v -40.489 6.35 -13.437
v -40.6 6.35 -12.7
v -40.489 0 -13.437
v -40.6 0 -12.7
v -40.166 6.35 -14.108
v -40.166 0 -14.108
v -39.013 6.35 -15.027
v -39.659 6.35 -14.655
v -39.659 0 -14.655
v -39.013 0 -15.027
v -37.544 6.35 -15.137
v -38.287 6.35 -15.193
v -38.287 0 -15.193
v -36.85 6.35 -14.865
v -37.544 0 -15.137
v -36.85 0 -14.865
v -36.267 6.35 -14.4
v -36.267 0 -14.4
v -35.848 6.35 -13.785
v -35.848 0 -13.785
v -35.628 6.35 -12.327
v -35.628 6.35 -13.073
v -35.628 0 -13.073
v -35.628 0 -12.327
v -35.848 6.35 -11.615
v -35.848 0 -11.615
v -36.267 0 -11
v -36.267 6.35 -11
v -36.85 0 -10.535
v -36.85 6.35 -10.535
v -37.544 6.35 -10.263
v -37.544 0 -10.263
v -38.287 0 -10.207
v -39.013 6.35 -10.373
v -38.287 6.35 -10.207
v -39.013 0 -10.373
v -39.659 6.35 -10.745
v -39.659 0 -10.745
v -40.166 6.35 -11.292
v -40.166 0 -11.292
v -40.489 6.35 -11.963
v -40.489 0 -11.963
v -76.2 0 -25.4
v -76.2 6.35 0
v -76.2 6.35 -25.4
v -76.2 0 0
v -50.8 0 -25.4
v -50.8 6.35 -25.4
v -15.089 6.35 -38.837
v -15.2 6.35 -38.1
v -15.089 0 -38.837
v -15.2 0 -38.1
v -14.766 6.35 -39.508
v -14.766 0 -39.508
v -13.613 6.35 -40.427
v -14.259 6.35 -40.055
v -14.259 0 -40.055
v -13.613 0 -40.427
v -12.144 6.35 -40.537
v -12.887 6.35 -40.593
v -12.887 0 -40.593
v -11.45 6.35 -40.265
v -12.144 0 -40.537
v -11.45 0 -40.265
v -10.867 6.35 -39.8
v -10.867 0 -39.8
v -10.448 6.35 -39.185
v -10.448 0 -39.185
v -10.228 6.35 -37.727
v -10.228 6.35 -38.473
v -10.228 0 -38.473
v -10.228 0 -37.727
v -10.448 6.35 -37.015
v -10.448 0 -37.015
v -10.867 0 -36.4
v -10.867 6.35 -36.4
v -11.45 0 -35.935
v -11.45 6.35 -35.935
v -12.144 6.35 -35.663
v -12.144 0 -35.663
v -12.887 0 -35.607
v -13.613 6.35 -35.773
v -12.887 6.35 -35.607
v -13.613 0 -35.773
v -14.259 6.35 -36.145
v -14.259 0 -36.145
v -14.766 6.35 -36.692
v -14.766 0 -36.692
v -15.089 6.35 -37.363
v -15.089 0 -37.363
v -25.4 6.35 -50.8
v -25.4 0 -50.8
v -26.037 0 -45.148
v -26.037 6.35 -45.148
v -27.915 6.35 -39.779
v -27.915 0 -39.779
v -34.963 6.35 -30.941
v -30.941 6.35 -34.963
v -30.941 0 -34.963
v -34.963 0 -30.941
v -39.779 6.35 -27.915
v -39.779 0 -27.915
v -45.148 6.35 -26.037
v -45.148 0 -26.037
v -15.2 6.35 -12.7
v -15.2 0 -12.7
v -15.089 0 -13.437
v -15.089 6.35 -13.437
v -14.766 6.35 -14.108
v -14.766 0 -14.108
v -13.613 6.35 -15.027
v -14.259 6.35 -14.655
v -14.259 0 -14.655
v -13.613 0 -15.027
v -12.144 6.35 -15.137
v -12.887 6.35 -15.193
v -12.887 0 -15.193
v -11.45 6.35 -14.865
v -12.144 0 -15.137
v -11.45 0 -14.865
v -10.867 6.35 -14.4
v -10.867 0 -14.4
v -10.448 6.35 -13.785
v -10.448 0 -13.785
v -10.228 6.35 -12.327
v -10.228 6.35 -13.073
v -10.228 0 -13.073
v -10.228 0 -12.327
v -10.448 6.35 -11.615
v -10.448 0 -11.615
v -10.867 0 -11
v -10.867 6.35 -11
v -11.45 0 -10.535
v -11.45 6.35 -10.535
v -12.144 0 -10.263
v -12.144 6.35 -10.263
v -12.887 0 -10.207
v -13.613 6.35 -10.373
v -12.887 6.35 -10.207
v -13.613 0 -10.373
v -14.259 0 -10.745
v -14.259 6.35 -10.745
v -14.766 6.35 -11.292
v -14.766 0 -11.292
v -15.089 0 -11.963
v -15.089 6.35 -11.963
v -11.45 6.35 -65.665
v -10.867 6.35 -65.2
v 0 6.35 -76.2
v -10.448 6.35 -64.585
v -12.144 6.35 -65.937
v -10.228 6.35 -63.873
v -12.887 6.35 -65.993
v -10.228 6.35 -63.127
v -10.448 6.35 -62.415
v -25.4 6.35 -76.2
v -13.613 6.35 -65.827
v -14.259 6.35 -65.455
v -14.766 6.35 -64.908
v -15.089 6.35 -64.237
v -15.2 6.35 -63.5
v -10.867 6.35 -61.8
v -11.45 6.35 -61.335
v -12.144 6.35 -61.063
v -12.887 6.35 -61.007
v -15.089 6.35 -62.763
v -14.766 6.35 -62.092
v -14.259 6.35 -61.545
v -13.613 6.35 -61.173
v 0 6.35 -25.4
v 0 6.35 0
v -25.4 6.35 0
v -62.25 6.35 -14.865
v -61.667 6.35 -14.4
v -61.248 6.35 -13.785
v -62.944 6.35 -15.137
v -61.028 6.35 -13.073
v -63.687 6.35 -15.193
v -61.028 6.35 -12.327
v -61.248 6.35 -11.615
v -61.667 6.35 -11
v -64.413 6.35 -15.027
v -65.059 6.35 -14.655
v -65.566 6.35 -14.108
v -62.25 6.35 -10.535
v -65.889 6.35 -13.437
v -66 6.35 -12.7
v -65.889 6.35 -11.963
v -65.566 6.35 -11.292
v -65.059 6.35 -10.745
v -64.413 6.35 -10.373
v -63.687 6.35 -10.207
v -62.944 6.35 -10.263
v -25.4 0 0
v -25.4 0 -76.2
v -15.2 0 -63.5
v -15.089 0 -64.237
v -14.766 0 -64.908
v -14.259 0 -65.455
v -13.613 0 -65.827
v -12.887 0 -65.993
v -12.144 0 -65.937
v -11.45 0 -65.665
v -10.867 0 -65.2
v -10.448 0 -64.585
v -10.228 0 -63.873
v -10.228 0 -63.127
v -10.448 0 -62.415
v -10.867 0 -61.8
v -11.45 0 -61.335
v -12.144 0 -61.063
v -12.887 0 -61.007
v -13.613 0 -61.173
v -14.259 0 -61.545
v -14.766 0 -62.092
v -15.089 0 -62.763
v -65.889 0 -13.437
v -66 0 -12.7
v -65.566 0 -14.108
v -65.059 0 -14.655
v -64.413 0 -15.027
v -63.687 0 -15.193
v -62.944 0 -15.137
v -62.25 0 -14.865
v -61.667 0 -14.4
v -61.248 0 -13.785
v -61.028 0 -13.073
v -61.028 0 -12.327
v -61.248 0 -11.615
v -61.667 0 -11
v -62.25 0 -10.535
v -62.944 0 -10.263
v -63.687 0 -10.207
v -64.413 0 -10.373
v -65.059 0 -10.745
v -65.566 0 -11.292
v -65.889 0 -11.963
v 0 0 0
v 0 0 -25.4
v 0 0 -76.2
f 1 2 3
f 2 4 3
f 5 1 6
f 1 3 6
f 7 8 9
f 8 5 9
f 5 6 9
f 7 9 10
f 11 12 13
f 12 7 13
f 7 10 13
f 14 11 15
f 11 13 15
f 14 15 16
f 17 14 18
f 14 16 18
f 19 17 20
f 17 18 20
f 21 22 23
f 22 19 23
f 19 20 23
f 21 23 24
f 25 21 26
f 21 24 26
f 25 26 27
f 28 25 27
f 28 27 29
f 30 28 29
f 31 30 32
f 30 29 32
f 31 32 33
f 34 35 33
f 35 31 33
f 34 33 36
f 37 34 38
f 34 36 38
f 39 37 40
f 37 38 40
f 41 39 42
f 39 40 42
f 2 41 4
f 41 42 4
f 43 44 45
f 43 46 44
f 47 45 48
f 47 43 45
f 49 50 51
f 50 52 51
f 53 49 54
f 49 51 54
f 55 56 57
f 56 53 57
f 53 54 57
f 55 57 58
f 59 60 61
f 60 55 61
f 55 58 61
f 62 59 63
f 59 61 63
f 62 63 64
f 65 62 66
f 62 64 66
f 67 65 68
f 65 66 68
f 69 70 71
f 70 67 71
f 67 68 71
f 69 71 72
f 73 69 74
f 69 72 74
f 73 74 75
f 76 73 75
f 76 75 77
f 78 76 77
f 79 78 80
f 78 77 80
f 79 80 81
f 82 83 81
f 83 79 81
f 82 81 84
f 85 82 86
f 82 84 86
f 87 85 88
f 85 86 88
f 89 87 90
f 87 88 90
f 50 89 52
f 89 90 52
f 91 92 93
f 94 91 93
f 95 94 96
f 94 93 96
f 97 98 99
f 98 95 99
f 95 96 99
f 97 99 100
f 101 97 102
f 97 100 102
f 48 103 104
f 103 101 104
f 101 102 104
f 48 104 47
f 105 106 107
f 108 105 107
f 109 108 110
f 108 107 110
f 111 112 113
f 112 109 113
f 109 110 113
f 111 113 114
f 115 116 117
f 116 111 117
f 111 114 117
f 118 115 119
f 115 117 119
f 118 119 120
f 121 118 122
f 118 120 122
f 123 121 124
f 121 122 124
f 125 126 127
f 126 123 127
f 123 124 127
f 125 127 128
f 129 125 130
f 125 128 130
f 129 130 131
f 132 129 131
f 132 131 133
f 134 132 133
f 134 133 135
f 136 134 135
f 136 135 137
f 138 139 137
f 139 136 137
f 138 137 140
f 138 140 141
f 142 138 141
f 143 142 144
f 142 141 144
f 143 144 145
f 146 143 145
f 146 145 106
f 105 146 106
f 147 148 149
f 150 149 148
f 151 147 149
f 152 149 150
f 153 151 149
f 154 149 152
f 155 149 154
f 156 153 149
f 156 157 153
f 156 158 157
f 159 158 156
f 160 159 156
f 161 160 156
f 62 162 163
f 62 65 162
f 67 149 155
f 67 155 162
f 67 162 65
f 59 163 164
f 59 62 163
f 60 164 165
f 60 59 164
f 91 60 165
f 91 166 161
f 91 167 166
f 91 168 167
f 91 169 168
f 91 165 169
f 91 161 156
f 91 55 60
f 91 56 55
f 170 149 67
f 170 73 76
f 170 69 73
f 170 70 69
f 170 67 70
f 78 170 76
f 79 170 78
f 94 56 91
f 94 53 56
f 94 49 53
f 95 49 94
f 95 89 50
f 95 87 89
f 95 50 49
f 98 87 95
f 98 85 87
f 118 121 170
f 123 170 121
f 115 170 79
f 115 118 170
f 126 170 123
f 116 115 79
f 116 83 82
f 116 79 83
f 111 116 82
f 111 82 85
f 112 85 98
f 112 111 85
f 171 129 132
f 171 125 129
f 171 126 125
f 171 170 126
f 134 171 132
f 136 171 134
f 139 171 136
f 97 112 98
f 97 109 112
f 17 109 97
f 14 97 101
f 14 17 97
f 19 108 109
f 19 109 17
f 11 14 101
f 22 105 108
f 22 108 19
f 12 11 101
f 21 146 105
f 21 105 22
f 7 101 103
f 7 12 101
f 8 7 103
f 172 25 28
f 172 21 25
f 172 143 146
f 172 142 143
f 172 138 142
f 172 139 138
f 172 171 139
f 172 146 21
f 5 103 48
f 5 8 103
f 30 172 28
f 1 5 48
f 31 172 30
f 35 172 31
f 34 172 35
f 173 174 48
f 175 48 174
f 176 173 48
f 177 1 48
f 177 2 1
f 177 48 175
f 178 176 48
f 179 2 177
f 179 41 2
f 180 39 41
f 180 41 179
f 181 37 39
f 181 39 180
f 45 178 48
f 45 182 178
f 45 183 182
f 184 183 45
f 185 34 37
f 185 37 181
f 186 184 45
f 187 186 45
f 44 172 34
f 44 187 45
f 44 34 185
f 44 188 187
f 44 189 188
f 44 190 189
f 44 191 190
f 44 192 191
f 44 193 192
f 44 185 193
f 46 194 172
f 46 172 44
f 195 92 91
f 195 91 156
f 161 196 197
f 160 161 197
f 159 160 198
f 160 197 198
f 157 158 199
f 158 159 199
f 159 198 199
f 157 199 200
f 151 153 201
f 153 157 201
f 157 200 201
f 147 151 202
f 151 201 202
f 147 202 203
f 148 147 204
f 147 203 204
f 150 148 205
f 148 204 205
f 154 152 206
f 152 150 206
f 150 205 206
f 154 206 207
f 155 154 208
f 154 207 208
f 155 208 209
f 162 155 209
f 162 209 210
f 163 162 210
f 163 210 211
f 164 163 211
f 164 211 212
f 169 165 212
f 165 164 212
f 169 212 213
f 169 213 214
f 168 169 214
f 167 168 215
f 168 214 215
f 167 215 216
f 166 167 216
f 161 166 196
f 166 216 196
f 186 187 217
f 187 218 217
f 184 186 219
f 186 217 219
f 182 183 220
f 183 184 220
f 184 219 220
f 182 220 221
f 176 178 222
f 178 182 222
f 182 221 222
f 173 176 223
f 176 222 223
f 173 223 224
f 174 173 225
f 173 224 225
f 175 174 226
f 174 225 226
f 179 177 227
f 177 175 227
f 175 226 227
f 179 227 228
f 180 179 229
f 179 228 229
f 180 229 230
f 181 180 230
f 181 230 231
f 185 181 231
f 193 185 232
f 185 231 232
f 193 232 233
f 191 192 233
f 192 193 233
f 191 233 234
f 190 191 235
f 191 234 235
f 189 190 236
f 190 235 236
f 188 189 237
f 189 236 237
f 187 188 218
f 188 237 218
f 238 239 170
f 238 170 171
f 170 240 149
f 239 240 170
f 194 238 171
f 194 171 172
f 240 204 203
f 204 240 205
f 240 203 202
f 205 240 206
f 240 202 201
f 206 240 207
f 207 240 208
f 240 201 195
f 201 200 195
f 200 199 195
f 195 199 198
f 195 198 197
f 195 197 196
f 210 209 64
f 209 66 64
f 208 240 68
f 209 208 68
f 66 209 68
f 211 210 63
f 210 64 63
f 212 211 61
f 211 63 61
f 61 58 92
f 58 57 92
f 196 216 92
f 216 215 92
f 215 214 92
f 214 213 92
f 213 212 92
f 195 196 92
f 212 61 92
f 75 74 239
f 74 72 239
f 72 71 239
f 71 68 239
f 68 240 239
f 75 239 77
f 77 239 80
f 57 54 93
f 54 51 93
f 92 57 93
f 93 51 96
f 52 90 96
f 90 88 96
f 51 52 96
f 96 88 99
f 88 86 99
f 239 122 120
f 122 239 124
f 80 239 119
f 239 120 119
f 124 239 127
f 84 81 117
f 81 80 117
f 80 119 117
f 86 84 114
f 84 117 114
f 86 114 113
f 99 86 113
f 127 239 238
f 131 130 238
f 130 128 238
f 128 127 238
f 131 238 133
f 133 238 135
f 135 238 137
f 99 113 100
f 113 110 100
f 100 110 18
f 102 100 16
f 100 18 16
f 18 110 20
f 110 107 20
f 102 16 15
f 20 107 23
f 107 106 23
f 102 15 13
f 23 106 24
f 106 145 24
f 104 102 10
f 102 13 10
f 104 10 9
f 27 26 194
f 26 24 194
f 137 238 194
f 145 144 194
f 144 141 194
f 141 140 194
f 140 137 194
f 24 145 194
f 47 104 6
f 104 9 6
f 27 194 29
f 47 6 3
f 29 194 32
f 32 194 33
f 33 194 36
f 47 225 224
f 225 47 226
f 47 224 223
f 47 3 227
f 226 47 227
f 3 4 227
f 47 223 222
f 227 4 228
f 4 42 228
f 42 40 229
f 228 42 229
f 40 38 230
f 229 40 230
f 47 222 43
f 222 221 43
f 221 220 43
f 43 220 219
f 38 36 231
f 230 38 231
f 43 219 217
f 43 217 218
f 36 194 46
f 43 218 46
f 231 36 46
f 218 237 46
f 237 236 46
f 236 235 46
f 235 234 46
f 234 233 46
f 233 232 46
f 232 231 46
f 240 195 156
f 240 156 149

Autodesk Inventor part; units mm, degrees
ref_plane "YZ Plane" through (0, 0, 0) normal (1, 0, 0) x (0, 1, 0)
ref_plane "XZ Plane" through (0, 0, 0) normal (0, 1, 0) x (-1, 0, 0)
ref_plane "XY Plane" through (0, 0, 0) normal (0, 0, 1) x (1, 0, 0)
sketch "Sketch1" plane through (0, 0, 0) normal (0, 1, 0) x (-1, 0, 0)
  line L0 (0, 0) -> (76.2, 0)
  line L1 (76.2, 0) -> (76.2, -25.4)
  line L2 (76.2, -25.4) -> (50.8, -25.4)
  line L3 (0, -25.4) -> (0, 0)
  line L4 (0, 0) -> (25.4, 0)
  line L5 (25.4, -50.8) -> (25.4, -76.2)
  line L6 (25.4, -76.2) -> (0, -76.2)
  line L7 (0, -76.2) -> (0, 0)
  arc A0 (50.8, -25.4) -> (25.4, -50.8) centre (50.8, -50.8) ccw
  circle A1 centre (63.5, -12.7) radius 2.5
  circle A2 centre (38.1, -12.7) radius 2.5
  circle A3 centre (12.7, -12.7) radius 2.5
  circle A4 centre (12.7, -38.1) radius 2.5
  circle A5 centre (12.7, -63.5) radius 2.5
  point P0 (12.7, -76.2)
  point P1 (76.2, -12.7)
  dimension "d0" = 76.2
  dimension "d1" = 25.4
  dimension "d2" = 25.4
  dimension "d3" = 76.2
  dimension "d4" = 25.4
  dimension "d5" = 5
  dimension "d6" = 5
  dimension "d7" = 5
  dimension "d8" = 5
  dimension "d9" = 5
  dimension "d10" = 12.7
  dimension "d11" = 12.7
  dimension "d12" = 12.7
  dimension "d13" = 12.7
  dimension "d14" = 12.7
  dimension "d15" = 12.7
  dimension "d16" = 38.1
  dimension "d17" = 38.1
  dimension "d18" = 12.7
  dimension "d19" = 12.7
extrude "Extrusion1" add sketch "Sketch1" along normal blind 6.35
equation "\"d11\" = d10"
equation "\"d12\" = d10"
equation "\"d13\" = d10"
equation "\"d14\" = d10"
equation "\"d15\" = d14"
equation "\"d16\" = 0.5 * d3"
equation "\"d17\" = 0.5 * d0"
equation "\"d18\" = d10"
equation "\"d19\" = d10"
properties part number "90CornerBracket" material "Phenolic Resin"
